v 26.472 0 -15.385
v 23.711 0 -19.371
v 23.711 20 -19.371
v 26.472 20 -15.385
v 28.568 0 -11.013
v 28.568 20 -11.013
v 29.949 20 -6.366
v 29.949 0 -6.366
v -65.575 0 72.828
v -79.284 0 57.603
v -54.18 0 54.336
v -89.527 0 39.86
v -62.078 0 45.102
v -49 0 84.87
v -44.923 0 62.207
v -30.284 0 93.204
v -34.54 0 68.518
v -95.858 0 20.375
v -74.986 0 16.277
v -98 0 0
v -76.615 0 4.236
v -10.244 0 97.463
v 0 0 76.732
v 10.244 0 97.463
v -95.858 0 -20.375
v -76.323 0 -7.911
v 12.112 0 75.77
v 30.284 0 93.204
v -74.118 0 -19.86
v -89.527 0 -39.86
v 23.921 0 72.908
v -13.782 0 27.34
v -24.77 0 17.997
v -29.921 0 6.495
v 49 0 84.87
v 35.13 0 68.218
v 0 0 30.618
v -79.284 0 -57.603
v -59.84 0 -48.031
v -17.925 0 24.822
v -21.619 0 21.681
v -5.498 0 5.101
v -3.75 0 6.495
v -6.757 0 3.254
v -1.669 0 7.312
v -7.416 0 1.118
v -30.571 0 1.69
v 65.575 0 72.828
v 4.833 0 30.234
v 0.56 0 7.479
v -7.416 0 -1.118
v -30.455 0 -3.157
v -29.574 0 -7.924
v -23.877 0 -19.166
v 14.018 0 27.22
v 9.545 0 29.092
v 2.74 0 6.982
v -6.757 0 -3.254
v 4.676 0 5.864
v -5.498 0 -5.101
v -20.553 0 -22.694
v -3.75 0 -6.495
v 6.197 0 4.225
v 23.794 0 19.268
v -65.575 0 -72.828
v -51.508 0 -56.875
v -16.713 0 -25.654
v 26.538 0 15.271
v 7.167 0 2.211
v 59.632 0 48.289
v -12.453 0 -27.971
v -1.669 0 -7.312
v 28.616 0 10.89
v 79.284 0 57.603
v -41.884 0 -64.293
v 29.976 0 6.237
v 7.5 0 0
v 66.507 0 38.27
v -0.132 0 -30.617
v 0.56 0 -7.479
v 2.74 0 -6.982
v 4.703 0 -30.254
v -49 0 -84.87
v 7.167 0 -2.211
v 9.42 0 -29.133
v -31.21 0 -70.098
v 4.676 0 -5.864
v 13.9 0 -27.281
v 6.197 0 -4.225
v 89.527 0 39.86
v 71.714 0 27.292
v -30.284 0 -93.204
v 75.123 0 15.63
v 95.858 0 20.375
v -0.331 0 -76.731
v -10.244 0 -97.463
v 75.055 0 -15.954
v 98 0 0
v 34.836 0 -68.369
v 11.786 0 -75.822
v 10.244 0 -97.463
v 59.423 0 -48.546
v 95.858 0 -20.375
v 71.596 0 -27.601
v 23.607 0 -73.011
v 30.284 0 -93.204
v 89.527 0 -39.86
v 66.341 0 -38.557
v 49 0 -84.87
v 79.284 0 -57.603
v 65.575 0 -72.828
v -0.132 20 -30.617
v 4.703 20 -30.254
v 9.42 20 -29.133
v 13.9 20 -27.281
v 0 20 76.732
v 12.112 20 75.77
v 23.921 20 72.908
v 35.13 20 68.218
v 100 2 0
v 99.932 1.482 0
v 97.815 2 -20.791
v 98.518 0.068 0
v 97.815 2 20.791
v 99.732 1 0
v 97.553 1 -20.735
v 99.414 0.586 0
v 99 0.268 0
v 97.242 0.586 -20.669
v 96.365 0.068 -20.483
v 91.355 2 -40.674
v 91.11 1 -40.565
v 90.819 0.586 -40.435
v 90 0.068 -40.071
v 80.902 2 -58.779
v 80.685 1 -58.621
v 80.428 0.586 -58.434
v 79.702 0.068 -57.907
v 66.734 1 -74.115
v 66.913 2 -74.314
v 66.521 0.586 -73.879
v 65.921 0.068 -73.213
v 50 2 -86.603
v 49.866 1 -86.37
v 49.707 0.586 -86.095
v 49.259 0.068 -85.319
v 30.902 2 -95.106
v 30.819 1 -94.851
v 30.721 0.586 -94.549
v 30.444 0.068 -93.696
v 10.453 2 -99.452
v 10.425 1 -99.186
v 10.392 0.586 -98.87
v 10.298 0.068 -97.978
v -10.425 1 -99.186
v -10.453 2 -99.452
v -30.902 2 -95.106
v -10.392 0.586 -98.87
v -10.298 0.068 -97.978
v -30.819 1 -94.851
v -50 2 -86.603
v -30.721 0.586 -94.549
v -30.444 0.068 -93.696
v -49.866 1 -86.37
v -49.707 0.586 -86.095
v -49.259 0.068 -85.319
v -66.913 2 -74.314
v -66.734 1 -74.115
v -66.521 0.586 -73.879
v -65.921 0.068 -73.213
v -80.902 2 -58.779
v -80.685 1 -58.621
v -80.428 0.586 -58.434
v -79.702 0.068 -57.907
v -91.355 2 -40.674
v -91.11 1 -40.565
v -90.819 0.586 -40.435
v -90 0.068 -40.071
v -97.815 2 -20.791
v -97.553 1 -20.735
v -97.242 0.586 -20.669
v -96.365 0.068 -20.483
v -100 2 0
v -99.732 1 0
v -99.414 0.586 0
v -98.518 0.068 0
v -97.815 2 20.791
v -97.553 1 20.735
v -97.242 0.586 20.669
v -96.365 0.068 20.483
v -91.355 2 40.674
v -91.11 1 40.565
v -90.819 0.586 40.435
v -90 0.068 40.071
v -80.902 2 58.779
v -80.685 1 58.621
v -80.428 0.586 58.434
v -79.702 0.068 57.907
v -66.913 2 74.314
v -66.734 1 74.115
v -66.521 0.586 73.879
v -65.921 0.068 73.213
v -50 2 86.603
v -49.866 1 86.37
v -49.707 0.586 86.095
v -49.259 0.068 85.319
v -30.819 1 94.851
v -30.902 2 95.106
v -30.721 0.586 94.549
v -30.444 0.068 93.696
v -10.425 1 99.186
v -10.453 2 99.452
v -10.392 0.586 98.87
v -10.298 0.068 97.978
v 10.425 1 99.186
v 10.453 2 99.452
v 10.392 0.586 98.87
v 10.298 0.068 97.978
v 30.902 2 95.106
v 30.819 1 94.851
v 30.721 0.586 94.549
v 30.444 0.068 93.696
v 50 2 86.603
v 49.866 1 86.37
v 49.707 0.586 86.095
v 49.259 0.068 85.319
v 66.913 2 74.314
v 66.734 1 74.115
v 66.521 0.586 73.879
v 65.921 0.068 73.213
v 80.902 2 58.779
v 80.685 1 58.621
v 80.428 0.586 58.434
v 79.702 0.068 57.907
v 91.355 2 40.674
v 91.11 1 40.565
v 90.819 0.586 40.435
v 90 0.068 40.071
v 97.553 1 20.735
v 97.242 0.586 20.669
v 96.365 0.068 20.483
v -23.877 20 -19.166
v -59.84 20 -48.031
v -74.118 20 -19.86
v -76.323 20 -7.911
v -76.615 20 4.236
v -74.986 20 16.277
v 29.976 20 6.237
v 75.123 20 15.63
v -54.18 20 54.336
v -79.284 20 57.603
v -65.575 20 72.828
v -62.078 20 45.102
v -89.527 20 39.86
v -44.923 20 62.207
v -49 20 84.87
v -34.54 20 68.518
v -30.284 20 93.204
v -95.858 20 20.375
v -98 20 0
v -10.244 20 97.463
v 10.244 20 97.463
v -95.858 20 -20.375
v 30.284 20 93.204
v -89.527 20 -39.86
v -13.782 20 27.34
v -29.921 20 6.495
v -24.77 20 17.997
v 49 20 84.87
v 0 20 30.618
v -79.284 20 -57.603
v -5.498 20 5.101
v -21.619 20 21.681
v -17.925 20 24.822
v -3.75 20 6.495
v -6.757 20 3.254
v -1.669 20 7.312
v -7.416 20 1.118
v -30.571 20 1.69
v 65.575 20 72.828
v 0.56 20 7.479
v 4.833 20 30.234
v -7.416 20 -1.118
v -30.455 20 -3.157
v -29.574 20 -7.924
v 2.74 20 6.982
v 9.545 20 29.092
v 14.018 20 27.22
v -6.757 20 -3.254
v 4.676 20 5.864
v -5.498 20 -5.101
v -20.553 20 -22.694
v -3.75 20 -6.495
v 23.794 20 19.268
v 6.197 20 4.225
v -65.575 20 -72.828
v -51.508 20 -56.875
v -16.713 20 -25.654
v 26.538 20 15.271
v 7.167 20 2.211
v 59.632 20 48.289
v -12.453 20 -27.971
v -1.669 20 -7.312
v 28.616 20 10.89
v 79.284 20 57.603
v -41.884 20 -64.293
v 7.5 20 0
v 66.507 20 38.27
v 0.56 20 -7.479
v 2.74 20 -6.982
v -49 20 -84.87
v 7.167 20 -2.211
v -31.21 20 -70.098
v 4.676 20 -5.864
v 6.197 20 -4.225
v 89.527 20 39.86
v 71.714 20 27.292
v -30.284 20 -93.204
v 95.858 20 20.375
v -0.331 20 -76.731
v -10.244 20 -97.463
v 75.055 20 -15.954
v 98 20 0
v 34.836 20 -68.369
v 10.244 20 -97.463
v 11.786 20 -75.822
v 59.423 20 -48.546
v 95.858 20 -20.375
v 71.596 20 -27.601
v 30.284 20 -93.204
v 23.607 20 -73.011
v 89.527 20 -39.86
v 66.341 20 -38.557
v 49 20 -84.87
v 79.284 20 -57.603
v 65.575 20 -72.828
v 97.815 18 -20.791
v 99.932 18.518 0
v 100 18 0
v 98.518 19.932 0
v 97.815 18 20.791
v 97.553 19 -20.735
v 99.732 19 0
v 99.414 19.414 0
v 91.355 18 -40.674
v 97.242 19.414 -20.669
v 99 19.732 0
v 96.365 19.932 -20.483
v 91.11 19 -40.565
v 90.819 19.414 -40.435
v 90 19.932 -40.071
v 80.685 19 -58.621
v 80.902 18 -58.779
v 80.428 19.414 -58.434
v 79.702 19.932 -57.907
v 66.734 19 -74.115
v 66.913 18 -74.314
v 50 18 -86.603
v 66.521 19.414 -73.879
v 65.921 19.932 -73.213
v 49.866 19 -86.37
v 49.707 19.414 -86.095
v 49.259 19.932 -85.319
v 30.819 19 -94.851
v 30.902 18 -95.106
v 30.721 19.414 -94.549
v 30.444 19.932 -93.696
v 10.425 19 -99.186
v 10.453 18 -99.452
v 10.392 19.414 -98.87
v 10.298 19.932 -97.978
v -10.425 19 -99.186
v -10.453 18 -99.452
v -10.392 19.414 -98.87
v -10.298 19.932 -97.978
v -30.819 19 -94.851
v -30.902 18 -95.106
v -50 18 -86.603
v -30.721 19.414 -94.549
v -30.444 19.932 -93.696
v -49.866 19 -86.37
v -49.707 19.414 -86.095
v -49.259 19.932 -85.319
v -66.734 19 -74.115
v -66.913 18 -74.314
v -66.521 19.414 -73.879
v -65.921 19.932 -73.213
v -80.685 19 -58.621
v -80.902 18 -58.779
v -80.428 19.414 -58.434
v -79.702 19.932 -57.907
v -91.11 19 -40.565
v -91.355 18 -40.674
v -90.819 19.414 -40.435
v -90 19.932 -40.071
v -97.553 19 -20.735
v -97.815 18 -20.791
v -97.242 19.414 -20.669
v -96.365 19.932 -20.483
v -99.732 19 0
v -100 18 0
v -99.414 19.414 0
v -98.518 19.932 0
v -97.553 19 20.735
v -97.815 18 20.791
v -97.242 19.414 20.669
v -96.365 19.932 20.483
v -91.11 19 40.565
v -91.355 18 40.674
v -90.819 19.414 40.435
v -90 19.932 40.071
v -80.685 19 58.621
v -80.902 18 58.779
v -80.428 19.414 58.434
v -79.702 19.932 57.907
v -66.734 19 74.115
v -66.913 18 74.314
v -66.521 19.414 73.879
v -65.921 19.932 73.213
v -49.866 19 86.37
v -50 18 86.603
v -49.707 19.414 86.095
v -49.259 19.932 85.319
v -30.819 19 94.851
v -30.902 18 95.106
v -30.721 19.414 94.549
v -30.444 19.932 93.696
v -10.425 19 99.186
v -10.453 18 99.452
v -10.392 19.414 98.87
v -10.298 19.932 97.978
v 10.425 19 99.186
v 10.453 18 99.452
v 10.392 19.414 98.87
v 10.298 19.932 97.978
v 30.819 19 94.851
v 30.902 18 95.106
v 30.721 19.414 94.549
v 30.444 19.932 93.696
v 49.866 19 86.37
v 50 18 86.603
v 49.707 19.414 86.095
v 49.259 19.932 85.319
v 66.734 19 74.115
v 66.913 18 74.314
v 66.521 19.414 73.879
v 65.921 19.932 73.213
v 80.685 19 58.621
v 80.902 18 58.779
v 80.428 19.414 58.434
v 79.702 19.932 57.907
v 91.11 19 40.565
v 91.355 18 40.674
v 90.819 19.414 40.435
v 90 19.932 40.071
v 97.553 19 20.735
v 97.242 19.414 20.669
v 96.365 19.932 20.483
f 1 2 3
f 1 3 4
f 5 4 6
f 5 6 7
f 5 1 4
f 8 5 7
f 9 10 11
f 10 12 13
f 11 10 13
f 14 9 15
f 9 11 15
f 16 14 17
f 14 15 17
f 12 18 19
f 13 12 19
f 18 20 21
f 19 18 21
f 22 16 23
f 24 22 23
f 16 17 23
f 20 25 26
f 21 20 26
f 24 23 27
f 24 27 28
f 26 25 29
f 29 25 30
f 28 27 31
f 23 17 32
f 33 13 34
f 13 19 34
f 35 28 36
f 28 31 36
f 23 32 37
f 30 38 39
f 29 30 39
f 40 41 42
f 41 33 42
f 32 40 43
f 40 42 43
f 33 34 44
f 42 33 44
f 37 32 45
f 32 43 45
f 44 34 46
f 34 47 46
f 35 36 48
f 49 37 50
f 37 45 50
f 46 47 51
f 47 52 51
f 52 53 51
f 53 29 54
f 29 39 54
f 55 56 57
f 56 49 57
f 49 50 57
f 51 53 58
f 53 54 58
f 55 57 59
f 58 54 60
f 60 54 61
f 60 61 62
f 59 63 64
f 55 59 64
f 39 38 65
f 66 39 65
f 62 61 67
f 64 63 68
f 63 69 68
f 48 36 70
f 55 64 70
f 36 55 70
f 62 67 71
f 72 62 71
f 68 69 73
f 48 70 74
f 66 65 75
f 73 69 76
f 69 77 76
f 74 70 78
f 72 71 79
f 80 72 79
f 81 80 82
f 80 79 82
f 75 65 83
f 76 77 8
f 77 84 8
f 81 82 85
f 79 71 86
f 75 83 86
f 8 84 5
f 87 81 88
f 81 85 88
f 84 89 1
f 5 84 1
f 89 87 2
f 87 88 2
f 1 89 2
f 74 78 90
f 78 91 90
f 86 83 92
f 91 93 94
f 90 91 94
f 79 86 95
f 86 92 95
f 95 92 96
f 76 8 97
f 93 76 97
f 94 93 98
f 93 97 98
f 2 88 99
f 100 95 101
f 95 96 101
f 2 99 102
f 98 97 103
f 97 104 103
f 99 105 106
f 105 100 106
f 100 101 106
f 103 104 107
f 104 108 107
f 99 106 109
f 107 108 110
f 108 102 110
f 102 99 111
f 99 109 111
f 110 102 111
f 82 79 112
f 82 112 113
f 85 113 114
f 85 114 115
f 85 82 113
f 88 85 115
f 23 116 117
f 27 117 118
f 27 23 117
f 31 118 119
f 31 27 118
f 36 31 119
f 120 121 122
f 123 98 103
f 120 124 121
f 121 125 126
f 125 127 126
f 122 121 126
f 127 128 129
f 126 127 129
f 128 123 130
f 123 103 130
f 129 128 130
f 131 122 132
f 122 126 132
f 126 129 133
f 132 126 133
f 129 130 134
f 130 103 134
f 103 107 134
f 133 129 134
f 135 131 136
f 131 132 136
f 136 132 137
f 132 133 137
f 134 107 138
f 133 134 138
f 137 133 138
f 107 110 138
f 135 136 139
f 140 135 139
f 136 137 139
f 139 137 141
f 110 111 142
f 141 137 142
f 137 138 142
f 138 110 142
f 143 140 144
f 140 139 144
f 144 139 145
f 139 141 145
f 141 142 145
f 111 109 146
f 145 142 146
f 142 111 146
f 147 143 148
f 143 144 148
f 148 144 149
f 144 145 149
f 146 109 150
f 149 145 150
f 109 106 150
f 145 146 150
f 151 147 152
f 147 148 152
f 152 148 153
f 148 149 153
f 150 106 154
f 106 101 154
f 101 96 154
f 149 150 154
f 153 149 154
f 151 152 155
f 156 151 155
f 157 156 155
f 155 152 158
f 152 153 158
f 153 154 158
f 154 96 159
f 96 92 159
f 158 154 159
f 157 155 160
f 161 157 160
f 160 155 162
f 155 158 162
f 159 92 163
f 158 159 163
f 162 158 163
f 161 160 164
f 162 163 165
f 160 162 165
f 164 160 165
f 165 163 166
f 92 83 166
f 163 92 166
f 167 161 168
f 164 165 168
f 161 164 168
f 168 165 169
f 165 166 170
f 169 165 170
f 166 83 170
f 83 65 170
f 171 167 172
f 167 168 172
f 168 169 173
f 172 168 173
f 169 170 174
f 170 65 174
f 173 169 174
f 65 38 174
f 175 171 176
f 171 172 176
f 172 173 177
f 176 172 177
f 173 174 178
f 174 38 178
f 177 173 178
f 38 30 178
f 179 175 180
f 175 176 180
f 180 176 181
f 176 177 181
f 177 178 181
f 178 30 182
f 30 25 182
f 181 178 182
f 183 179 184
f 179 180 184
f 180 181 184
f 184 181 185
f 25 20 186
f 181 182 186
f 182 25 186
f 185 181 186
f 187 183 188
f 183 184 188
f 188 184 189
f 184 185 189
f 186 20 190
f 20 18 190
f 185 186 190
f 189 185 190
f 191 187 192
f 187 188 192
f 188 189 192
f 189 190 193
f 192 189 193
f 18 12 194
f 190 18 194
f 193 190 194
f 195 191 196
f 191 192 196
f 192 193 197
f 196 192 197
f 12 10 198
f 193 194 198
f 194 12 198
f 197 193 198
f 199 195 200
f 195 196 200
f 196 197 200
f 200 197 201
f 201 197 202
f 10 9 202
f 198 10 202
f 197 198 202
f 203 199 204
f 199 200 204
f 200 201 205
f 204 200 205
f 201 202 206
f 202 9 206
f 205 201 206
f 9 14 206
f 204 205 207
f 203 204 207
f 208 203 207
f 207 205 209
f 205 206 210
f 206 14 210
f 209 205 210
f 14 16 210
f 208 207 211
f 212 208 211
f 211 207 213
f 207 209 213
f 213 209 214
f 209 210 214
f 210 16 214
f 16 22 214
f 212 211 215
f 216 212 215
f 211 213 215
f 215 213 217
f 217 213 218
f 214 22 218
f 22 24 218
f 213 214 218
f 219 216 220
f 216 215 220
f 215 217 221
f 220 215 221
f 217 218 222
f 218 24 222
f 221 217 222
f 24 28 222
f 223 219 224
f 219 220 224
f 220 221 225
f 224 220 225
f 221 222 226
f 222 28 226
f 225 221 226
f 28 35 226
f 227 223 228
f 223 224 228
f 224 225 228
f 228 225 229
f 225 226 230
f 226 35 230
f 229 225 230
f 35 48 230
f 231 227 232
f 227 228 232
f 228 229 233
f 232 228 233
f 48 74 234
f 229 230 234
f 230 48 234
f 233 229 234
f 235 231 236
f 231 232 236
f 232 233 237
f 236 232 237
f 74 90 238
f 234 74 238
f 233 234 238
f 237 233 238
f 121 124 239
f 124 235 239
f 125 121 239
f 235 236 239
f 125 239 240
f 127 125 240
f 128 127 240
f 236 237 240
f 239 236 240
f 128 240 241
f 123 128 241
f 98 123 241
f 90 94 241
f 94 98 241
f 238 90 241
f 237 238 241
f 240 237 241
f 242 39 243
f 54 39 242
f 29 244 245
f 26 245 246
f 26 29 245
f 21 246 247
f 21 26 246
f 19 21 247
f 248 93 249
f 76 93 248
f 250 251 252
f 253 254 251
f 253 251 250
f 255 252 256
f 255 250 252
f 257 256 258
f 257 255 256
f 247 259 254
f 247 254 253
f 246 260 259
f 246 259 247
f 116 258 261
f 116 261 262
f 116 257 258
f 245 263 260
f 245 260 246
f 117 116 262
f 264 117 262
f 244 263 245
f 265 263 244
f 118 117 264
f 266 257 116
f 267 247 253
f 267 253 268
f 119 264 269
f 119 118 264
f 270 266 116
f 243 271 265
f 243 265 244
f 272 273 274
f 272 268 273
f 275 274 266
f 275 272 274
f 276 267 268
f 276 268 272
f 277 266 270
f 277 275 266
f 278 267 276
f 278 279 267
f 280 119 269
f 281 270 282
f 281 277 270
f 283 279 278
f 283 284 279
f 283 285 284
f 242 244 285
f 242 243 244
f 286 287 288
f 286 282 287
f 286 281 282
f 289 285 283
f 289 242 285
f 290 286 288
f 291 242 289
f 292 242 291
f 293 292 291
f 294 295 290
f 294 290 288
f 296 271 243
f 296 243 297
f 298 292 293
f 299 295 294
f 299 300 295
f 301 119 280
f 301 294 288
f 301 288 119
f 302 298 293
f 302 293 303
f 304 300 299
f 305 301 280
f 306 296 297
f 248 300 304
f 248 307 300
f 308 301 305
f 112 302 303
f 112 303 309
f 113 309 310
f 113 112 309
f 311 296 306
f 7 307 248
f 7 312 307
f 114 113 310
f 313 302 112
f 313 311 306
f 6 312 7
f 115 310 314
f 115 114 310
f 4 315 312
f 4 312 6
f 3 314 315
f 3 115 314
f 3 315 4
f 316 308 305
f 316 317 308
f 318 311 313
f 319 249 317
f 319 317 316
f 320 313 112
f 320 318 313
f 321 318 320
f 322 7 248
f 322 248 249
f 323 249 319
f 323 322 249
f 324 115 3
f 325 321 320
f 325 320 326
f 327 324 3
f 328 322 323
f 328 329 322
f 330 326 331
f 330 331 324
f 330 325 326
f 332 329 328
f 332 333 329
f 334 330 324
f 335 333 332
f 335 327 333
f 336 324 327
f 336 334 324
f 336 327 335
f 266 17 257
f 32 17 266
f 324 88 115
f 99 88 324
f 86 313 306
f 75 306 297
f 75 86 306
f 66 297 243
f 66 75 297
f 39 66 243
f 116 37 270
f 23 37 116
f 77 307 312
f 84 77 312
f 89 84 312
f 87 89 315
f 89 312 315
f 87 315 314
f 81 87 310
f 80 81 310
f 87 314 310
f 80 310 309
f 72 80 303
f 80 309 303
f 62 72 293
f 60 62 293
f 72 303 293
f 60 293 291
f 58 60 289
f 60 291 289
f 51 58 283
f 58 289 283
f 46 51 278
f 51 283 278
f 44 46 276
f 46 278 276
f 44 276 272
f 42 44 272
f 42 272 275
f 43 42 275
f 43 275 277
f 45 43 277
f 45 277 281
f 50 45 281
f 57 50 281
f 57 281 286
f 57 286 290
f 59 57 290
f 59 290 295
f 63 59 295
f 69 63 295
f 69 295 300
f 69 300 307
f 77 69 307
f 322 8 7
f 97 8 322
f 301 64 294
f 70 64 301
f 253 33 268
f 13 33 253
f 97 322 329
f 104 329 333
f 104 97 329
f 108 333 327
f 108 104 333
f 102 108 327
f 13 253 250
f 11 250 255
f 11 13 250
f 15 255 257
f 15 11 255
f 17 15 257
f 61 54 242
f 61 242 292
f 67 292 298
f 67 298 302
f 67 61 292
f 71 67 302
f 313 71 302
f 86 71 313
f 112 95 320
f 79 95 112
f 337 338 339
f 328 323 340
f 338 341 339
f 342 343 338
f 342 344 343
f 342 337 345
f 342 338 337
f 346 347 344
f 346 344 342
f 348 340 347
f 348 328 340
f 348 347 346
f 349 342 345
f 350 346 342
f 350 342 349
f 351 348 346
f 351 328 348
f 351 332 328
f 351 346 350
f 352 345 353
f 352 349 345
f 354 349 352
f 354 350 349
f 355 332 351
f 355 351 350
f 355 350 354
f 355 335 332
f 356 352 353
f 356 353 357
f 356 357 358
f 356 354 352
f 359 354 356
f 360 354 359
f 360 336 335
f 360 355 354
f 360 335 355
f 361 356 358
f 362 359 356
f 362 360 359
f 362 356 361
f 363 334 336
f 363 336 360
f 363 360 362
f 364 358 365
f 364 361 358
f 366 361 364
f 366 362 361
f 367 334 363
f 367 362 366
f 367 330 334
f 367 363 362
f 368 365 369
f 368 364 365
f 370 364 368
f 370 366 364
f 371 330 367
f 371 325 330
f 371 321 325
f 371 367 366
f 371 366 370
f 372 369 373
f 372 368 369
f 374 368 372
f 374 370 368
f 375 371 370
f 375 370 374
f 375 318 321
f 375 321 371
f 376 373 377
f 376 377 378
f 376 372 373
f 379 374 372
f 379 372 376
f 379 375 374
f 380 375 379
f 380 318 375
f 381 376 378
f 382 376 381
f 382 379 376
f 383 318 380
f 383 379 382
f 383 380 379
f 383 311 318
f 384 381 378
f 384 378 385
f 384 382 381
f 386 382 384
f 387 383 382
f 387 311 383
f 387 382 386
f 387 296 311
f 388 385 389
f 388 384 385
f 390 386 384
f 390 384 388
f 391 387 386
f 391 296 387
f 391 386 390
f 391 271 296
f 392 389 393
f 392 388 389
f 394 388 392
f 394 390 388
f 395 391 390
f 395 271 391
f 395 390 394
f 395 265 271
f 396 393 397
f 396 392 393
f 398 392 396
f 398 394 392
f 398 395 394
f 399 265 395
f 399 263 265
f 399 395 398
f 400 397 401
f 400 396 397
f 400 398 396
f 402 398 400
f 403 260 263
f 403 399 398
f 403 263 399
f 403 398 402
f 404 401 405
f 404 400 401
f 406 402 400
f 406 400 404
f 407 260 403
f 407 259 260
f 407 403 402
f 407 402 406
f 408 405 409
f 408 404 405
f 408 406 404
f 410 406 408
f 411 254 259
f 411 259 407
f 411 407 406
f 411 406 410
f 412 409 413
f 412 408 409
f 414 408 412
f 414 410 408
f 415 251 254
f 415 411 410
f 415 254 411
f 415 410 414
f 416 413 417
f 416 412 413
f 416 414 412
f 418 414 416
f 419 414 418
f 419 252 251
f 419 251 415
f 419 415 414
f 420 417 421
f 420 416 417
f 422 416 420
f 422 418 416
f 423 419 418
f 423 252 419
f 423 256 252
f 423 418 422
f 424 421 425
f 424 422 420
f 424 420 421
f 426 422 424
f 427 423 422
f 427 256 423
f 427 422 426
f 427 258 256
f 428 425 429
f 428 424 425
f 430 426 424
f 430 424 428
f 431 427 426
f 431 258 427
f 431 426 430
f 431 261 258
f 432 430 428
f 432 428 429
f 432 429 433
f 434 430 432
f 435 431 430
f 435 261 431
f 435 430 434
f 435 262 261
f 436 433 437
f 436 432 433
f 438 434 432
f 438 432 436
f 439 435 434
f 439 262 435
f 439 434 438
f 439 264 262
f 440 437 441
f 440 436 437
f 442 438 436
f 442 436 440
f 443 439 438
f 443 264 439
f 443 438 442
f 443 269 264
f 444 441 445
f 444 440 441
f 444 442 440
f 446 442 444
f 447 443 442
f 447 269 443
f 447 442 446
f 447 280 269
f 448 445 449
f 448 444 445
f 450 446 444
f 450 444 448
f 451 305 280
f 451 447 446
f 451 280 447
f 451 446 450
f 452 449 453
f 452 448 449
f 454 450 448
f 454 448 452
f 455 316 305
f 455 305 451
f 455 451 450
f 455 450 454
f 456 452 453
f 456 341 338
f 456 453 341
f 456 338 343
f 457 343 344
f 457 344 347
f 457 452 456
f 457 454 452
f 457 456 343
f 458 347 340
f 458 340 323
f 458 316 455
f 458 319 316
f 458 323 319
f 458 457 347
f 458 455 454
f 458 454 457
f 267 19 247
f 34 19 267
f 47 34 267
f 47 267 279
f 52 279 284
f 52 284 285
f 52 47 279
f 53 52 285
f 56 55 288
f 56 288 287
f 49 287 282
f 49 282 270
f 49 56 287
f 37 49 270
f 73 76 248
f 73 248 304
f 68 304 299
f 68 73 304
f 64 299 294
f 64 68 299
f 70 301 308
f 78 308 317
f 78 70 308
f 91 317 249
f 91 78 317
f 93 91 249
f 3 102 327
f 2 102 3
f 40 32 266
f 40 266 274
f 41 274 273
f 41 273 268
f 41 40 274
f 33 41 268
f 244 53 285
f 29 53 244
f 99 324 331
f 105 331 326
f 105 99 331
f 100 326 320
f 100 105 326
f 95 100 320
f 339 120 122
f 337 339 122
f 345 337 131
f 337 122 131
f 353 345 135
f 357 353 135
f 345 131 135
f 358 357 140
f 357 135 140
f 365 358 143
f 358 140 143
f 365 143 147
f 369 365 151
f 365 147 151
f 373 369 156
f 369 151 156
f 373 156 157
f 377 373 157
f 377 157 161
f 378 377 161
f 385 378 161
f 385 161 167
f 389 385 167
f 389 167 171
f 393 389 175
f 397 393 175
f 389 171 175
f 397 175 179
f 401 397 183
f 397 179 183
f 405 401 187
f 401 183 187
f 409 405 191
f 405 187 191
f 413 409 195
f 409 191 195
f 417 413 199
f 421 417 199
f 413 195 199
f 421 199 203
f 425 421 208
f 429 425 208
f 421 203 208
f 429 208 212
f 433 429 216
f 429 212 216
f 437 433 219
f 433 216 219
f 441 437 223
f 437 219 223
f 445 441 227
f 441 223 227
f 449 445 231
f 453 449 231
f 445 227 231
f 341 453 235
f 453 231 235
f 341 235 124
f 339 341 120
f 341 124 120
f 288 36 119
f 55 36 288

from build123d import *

# Parameters (mm, degrees)
SKETCH1_R           = 100
BOSS_EXTRUDE1_DEPTH = 20
FILLET1_R           = 2
SKETCH2_R           = 7.5
CUT_EXTRUDE1_DEPTH  = 21
CUT_EXTRUDE2_DEPTH  = 21
CIRPATTERN1_COUNT   = 7
CIRPATTERN1_ANGLE   = 306


with BuildPart() as part:
    # Sketch1 → Boss-Extrude1 (new body)
    with BuildSketch(Plane(origin=(0, 0, 0), x_dir=(1, 0, 0), z_dir=(0, 1, 0))):
        Circle(SKETCH1_R)
    extrude(amount=BOSS_EXTRUDE1_DEPTH)

    # Fillet1
    fillet1_edges = [part.edges().sort_by_distance(p)[0] for p in [
        (-100, 0, 0),
        (-100, 20, 0),
    ]]
    fillet(fillet1_edges, radius=FILLET1_R)

    # Sketch2 → Cut-Extrude1 (cut, through all)
    with BuildSketch(Plane(origin=(0, 20, 0), x_dir=(1, 0, 0), z_dir=(0, 1, 0))):
        Circle(SKETCH2_R)
    extrude(amount=-CUT_EXTRUDE1_DEPTH, mode=Mode.SUBTRACT)

    # Sketch3 → Cut-Extrude2 (cut, through all)
    with BuildSketch(Plane.XZ):
        with BuildLine():
            Line((0, 30.617728898), (0, 76.732128088))
            ThreePointArc((0, 76.732128088), (18.073615255, 74.573211762), (35.130200903, 68.217948265))
            Line((35.130200903, 68.217948265), (14.017687169, 27.220392527))
            ThreePointArc((14.017687169, 27.220392527), (7.21175166, 29.756275991), (0, 30.617728898))
        make_face()
    cut_extrude2 = extrude(amount=-CUT_EXTRUDE2_DEPTH, mode=Mode.SUBTRACT)

    # CirPattern1: Cut-Extrude2 ×7 about axis
    cirpattern1_axis = Axis((0, 0, 0), (0, 1, 0))
    for i in range(1, CIRPATTERN1_COUNT):
        add(cut_extrude2.rotate(cirpattern1_axis, i * CIRPATTERN1_ANGLE / (CIRPATTERN1_COUNT - 1)), mode=Mode.SUBTRACT)


solid = part.part
